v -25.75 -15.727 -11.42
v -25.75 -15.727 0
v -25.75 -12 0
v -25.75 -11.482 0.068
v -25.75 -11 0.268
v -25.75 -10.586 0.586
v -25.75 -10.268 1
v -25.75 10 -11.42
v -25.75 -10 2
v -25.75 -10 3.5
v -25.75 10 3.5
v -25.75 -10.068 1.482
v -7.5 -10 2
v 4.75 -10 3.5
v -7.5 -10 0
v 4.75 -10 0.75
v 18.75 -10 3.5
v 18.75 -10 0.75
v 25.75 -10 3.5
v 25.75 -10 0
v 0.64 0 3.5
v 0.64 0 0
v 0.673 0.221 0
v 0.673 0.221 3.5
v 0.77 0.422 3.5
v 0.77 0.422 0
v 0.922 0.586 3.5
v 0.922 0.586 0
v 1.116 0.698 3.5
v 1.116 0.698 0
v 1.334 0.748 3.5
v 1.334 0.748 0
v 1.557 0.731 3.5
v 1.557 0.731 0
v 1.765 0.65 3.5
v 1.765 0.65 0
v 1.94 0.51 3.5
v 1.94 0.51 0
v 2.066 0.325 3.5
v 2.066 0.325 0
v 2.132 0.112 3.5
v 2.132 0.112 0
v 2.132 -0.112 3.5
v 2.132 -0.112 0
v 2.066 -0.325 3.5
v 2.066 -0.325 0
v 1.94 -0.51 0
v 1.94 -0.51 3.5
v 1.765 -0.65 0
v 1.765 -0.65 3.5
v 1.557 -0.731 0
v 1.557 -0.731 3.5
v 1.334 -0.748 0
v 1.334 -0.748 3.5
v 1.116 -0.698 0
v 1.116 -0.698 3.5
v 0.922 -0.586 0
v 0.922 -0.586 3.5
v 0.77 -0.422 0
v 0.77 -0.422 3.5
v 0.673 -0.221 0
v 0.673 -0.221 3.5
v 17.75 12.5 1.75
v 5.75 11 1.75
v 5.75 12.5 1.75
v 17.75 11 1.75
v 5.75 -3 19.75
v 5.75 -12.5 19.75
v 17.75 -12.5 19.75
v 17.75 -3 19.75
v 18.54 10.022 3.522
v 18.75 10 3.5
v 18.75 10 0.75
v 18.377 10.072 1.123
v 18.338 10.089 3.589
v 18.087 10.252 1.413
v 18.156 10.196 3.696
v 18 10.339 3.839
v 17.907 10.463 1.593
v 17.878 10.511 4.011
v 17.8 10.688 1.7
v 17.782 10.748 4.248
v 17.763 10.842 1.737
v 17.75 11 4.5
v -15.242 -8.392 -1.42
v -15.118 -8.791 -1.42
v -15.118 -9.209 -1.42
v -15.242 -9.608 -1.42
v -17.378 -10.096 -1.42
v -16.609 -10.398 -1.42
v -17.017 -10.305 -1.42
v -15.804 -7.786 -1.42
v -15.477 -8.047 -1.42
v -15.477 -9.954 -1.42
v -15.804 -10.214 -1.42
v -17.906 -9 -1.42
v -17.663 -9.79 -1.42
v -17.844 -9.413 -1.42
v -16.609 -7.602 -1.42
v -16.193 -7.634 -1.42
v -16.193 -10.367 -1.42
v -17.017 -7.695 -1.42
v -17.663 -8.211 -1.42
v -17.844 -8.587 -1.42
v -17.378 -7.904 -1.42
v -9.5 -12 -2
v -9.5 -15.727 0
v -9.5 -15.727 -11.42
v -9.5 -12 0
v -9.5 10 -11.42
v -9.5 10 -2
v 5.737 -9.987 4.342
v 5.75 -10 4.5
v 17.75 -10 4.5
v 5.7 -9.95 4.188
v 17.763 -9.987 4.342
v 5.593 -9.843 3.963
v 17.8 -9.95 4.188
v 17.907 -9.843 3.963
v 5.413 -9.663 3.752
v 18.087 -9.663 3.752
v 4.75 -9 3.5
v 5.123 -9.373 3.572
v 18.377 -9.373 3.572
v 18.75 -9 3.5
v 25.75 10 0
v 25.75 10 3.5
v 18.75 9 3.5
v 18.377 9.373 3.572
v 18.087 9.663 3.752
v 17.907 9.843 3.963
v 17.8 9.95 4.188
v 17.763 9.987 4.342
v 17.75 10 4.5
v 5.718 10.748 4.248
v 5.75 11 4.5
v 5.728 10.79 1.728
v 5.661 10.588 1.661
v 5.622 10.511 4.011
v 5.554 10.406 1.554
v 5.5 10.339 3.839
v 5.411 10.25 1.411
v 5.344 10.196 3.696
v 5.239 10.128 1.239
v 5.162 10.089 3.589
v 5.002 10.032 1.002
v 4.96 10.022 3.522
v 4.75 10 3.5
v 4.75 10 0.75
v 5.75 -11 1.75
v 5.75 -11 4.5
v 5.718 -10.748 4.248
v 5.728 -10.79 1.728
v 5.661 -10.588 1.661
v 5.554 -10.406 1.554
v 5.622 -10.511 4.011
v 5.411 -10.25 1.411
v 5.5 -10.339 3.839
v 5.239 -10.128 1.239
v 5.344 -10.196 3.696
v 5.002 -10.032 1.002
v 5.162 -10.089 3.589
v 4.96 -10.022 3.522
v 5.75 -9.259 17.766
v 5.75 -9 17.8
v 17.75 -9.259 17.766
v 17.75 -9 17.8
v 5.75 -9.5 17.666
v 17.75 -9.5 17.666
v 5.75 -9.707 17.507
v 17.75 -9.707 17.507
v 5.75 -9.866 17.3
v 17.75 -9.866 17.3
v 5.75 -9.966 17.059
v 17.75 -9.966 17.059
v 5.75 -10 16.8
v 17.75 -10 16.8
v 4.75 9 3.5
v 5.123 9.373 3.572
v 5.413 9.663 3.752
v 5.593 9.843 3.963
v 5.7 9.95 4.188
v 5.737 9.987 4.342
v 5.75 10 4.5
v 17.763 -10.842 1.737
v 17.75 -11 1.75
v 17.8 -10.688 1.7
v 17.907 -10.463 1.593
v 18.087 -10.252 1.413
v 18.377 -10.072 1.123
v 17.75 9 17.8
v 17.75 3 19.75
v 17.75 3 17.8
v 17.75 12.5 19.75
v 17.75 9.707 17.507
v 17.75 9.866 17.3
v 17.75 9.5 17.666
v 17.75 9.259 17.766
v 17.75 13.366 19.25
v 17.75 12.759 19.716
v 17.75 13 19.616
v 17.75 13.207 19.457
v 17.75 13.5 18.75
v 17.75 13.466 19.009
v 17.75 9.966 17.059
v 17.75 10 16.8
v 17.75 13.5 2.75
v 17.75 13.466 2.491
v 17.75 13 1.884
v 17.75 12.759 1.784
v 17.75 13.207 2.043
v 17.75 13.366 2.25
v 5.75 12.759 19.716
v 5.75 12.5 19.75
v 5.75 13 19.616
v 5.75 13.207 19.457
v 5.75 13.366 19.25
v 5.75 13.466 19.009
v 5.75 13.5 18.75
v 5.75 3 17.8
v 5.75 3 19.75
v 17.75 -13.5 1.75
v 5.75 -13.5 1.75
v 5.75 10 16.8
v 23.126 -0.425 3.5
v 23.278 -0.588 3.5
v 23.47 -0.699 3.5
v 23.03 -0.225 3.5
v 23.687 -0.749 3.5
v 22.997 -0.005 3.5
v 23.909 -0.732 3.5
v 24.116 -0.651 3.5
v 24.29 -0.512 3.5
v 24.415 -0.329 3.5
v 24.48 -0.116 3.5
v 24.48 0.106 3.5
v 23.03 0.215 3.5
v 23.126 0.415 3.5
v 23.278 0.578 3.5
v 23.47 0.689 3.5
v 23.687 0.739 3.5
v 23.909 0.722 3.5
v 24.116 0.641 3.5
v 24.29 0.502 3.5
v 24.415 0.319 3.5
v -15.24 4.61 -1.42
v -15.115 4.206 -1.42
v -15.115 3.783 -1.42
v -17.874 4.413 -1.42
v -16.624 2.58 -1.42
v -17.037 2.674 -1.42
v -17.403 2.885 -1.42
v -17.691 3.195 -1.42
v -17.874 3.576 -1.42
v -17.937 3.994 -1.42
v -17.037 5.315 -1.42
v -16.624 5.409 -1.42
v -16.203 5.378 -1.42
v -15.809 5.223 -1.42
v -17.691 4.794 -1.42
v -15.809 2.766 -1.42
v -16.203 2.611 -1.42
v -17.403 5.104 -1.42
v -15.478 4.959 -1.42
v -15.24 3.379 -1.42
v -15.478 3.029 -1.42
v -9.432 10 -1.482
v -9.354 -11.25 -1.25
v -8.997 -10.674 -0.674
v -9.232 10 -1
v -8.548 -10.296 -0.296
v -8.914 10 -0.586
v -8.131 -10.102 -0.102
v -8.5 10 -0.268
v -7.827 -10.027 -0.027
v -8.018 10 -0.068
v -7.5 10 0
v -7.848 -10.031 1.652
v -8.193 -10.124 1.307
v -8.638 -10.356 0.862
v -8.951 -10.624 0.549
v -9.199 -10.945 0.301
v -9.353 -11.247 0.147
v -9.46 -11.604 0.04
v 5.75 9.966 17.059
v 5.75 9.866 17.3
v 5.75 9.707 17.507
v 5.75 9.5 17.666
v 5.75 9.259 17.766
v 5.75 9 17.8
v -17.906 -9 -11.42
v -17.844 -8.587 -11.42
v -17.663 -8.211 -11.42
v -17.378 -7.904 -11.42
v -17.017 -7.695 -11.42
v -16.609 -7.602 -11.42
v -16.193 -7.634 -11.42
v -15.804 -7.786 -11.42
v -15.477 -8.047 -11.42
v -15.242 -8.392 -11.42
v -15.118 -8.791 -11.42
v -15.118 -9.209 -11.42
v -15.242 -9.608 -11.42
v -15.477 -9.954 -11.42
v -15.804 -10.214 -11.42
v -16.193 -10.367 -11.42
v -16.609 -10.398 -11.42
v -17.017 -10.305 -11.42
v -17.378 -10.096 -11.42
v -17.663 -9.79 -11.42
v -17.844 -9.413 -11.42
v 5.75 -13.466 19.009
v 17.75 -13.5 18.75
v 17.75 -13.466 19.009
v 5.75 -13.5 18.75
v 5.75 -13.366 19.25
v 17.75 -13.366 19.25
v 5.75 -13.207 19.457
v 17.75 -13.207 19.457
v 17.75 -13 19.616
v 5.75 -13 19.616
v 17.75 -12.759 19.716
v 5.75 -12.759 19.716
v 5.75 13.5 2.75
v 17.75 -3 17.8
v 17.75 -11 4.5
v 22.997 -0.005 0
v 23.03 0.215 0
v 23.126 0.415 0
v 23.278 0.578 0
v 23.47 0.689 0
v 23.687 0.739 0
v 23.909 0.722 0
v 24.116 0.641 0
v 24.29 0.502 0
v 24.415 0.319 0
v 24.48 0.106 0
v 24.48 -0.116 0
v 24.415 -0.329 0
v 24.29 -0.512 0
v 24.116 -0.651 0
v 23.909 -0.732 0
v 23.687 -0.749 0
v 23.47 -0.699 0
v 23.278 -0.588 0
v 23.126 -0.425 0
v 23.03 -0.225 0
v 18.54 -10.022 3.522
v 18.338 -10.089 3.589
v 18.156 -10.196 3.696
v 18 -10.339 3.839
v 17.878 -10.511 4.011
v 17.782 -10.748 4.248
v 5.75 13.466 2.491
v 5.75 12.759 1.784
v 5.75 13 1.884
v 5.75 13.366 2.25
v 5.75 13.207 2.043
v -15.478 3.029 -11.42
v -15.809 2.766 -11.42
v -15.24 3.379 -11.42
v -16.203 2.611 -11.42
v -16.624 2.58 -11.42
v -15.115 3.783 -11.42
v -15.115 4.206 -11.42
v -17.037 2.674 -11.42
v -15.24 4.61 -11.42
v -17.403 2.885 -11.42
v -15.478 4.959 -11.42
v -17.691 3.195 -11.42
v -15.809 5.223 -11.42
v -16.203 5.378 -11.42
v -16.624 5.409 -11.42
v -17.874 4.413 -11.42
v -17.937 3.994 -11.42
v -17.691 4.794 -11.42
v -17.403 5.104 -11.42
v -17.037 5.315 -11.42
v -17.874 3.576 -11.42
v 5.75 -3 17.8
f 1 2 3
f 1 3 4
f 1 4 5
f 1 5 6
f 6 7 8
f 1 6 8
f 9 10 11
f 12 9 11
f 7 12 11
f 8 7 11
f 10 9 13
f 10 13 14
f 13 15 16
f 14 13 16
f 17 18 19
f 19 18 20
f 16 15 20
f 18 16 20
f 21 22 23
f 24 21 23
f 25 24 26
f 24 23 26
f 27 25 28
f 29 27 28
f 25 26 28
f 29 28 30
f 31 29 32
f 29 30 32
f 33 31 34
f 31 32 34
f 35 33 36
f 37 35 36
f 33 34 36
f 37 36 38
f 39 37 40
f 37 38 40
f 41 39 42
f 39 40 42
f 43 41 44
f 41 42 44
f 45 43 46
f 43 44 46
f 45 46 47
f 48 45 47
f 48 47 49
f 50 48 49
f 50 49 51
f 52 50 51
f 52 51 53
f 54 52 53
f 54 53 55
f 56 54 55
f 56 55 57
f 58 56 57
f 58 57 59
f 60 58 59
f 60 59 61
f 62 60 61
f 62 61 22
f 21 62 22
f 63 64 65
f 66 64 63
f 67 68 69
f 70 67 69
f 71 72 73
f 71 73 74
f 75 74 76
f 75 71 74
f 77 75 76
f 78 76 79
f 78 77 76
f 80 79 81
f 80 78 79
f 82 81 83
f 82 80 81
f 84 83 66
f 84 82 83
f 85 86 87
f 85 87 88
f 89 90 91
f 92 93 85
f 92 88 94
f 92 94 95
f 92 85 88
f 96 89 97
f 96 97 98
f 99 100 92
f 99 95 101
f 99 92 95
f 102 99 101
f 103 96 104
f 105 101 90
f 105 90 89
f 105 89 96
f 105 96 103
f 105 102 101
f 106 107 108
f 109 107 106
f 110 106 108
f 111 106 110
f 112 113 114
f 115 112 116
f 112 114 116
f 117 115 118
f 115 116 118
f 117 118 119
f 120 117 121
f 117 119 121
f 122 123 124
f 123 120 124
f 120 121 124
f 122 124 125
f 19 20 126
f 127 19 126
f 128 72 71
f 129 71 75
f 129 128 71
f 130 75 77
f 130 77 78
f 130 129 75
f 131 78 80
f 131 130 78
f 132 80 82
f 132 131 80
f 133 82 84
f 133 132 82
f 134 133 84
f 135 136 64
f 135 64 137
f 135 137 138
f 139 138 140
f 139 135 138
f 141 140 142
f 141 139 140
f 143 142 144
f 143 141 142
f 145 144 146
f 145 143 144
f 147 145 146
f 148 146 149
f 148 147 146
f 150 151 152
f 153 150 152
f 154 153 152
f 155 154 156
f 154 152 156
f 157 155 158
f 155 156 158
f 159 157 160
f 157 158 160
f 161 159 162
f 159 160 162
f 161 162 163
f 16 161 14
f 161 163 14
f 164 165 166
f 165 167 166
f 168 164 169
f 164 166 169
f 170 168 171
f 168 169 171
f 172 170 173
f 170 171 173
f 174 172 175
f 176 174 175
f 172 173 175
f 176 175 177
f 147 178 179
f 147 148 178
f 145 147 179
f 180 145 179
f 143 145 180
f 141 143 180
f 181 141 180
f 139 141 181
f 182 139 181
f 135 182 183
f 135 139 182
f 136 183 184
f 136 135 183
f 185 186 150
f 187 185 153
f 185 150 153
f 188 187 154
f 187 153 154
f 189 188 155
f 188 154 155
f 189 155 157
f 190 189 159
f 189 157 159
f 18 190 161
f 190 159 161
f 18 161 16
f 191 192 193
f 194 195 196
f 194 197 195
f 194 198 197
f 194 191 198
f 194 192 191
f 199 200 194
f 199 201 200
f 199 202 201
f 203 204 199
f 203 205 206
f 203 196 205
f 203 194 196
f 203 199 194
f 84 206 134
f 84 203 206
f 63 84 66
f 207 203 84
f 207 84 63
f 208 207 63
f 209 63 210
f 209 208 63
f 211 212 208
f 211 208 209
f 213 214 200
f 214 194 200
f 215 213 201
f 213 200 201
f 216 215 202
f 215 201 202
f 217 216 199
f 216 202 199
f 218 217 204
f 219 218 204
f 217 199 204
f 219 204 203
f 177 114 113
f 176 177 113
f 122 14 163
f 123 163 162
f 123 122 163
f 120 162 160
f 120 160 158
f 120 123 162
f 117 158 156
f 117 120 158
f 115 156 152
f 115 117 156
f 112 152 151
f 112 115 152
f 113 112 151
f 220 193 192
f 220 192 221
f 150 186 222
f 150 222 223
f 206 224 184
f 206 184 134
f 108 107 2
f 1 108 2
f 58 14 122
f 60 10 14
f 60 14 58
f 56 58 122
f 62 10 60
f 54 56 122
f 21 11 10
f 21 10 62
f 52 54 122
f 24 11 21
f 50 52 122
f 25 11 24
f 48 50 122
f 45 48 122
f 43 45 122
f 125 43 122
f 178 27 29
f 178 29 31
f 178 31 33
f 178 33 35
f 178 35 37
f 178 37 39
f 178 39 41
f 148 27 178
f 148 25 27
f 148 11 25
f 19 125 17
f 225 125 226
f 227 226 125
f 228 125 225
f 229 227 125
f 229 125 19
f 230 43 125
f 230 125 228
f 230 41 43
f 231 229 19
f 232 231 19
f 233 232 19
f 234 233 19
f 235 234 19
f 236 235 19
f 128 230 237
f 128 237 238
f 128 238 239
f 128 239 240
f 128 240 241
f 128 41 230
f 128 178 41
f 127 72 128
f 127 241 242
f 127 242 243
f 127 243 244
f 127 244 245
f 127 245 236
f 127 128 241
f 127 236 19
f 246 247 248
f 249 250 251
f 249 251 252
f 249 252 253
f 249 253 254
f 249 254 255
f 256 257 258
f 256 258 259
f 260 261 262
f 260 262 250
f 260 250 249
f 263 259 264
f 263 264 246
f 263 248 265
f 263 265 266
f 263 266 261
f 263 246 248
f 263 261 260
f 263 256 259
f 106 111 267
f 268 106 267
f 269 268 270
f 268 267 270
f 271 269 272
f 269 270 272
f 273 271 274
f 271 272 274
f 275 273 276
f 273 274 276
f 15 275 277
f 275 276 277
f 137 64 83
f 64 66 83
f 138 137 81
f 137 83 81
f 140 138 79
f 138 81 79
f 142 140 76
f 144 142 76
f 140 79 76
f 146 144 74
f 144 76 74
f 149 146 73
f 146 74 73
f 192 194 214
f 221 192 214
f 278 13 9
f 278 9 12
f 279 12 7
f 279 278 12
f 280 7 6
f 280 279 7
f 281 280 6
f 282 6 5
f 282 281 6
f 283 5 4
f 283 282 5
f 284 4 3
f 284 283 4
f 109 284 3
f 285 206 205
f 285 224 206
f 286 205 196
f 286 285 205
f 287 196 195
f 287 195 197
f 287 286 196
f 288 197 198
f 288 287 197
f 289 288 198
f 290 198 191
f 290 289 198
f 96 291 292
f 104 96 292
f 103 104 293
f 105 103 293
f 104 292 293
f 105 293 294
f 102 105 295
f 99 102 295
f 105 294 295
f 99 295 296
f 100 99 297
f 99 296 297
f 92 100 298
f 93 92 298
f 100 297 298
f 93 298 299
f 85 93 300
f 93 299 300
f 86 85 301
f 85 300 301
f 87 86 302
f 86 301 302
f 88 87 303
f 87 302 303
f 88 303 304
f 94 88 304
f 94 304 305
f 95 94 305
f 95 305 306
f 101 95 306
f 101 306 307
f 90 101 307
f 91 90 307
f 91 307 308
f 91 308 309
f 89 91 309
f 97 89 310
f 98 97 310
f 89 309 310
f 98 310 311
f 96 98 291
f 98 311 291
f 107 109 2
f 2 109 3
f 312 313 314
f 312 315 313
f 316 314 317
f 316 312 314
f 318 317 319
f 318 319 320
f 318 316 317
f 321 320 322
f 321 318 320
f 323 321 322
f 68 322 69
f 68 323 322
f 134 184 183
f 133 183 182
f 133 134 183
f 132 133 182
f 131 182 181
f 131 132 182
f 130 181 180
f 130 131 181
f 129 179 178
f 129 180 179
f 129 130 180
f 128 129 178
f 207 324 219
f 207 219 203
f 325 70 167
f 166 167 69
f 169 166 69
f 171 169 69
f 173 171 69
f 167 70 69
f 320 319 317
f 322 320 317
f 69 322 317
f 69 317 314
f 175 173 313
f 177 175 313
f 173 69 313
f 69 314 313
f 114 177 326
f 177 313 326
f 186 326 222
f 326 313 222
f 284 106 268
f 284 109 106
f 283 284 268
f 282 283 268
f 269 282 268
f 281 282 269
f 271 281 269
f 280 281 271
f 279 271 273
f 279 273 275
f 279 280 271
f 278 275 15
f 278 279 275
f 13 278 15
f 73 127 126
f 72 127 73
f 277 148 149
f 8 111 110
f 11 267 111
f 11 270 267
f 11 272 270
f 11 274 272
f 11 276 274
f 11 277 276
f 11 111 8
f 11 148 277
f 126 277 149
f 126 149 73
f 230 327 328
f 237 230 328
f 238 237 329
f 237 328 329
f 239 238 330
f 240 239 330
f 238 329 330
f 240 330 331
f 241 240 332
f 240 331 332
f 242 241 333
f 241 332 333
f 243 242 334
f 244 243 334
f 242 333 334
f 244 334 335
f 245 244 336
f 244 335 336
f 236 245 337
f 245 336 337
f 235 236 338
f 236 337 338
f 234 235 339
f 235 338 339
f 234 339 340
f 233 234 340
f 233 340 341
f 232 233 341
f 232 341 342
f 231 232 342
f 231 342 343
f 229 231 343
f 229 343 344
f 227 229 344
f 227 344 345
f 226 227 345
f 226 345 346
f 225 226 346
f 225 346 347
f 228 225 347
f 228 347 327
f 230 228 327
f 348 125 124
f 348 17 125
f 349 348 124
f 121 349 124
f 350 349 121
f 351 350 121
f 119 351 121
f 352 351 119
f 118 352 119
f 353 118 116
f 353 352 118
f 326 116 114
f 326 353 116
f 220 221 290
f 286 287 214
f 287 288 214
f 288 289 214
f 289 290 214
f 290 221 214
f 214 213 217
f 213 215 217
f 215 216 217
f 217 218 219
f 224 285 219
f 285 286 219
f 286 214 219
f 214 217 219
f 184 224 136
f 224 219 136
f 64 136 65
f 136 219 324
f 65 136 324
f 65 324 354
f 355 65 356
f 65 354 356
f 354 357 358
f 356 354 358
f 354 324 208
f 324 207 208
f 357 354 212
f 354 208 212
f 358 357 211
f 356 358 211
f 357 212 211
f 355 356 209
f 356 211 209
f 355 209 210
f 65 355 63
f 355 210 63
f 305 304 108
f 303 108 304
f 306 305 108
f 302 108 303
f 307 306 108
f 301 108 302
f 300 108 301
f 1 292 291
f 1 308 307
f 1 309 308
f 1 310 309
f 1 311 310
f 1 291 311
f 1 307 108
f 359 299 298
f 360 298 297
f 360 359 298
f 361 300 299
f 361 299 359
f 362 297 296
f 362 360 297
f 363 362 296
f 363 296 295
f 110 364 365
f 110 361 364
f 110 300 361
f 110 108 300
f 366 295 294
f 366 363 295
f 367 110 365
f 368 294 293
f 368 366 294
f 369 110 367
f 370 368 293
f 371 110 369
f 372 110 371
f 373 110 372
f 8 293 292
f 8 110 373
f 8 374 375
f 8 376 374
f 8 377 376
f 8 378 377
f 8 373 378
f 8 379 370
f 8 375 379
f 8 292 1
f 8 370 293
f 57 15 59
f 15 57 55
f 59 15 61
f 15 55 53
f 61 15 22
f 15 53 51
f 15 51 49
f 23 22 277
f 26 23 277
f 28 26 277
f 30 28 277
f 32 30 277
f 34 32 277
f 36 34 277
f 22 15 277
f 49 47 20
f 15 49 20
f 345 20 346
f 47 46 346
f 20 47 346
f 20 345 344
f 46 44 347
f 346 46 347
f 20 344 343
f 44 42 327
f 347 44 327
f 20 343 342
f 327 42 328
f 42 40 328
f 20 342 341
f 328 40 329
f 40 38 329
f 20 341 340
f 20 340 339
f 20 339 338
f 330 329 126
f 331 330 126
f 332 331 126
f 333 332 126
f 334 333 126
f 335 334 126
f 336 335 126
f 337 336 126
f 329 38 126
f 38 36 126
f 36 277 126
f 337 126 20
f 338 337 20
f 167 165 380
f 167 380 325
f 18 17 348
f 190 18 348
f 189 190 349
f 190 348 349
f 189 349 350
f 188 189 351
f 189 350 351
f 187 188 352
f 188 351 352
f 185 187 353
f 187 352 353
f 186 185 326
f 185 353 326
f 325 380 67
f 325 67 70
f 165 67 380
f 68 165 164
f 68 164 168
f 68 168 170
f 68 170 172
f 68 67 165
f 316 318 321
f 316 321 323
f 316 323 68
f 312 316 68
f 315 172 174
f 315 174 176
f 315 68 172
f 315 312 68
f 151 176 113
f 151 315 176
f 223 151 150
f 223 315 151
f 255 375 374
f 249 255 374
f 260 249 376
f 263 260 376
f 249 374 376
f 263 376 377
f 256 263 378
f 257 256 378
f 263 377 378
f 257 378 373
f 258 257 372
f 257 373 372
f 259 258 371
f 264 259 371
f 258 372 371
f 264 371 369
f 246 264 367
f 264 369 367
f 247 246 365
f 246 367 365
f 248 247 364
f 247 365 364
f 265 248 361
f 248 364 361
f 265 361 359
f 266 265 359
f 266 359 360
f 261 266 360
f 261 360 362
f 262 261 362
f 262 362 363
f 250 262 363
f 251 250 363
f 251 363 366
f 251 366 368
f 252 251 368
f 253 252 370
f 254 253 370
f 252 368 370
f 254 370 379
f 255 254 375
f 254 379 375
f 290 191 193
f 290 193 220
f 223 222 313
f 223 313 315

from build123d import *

# Parameters (mm, degrees)
SKETCH1_W           = 51.5
SKETCH1_H           = 20
BOSS_EXTRUDE1_DEPTH = 3.5
SKETCH2_W           = 12
SKETCH2_H           = 18
BOSS_EXTRUDE2_DEPTH = 3.5
FILLET1_R           = 1
FILLET2_R           = 1
SKETCH3_W           = 12
SKETCH3_H           = 18
BOSS_EXTRUDE3_DEPTH = 3.5
FILLET3_R           = 1
FILLET4_R           = 1
FILLET5_R           = 1
FILLET6_R           = 1
FILLET7_R           = 1
FILLET8_R           = 1
FILLET9_R           = 1
FILLET10_R          = 1
FILLET11_R          = 1
FILLET12_R          = 1
SKETCH4_W           = 12
SKETCH4_H           = 1.95
BOSS_EXTRUDE4_DEPTH = 7
SKETCH5_W           = 12
SKETCH5_H           = 1.95
BOSS_EXTRUDE5_DEPTH = 7
FILLET13_R          = 1
FILLET14_R          = 1
FILLET15_R          = 1
FILLET16_R          = 1
FILLET17_R          = 1
SKETCH8_W           = 16.25
SKETCH8_H           = 25.726511914
BOSS_EXTRUDE6_DEPTH = 11.42
FILLET21_R          = 2
FILLET22_R          = 2
FILLET23_R          = 2
SKETCH9_R           = 0.745983734
CUT_EXTRUDE1_DEPTH  = 10
SKETCH10_R          = 0.75
CUT_EXTRUDE2_DEPTH  = 10
SKETCH11_R          = 1.41875541
CUT_EXTRUDE3_DEPTH  = 10
SKETCH12_R          = 1.401780947
CUT_EXTRUDE4_DEPTH  = 10


with BuildPart() as part:
    # Sketch1 → Boss-Extrude1 (new body)
    with BuildSketch(Plane.XY):
        Rectangle(SKETCH1_W, SKETCH1_H)
    extrude(amount=BOSS_EXTRUDE1_DEPTH)

    # Sketch2 → Boss-Extrude2 (add)
    with BuildSketch(Plane(origin=(0, 10, 0), x_dir=(1, 0, 0), z_dir=(0, 1, 0))):
        with Locations((11.75, -10.75)):
            Rectangle(SKETCH2_W, SKETCH2_H)
    extrude(amount=BOSS_EXTRUDE2_DEPTH)

    # Fillet1
    fillet1_edges = [part.edges().sort_by_distance(p)[0] for p in [
        (11.75, 10, 1.75),
    ]]
    fillet(fillet1_edges, radius=FILLET1_R)

    # Fillet2
    fillet2_edges = [part.edges().sort_by_distance(p)[0] for p in [
        (11.75, 10, 3.5),
    ]]
    fillet(fillet2_edges, radius=FILLET2_R)

    # Sketch3 → Boss-Extrude3 (add)
    with BuildSketch(Plane(origin=(0, -10, 0), x_dir=(-1, 0, 0), z_dir=(0, -1, 0))):
        with Locations((-11.75, -10.75)):
            Rectangle(SKETCH3_W, SKETCH3_H)
    extrude(amount=BOSS_EXTRUDE3_DEPTH)

    # Fillet3
    fillet3_edges = [part.edges().sort_by_distance(p)[0] for p in [
        (11.75, -10, 1.75),
    ]]
    fillet(fillet3_edges, radius=FILLET3_R)

    # Fillet4
    fillet4_edges = [part.edges().sort_by_distance(p)[0] for p in [
        (11.75, -10, 3.5),
    ]]
    fillet(fillet4_edges, radius=FILLET4_R)

    # Fillet5
    fillet5_edges = [part.edges().sort_by_distance(p)[0] for p in [
        (17.75, 10, 2.125),
    ]]
    fillet(fillet5_edges, radius=FILLET5_R)

    # Fillet6
    fillet6_edges = [part.edges().sort_by_distance(p)[0] for p in [
        (5.75, 10, 2.125),
    ]]
    fillet(fillet6_edges, radius=FILLET6_R)

    # Fillet7
    fillet7_edges = [part.edges().sort_by_distance(p)[0] for p in [
        (17.75, 10, 3.5),
    ]]
    fillet(fillet7_edges, radius=FILLET7_R)

    # Fillet8
    fillet8_edges = [part.edges().sort_by_distance(p)[0] for p in [
        (5.75, 10, 3.5),
    ]]
    fillet(fillet8_edges, radius=FILLET8_R)

    # Fillet9
    fillet9_edges = [part.edges().sort_by_distance(p)[0] for p in [
        (5.75, -10, 2.125),
    ]]
    fillet(fillet9_edges, radius=FILLET9_R)

    # Fillet10
    fillet10_edges = [part.edges().sort_by_distance(p)[0] for p in [
        (5.75, -10, 3.5),
    ]]
    fillet(fillet10_edges, radius=FILLET10_R)

    # Fillet11
    fillet11_edges = [part.edges().sort_by_distance(p)[0] for p in [
        (17.75, -10, 2.125),
    ]]
    fillet(fillet11_edges, radius=FILLET11_R)

    # Fillet12
    fillet12_edges = [part.edges().sort_by_distance(p)[0] for p in [
        (17.75, -10, 3.5),
    ]]
    fillet(fillet12_edges, radius=FILLET12_R)

    # Sketch4 → Boss-Extrude4 (add)
    with BuildSketch(Plane(origin=(0, -10, 0), x_dir=(1, 0, 0), z_dir=(0, 1, 0))):
        with Locations((11.75, -18.775)):
            Rectangle(SKETCH4_W, SKETCH4_H)
    extrude(amount=BOSS_EXTRUDE4_DEPTH)

    # Sketch5 → Boss-Extrude5 (add)
    with BuildSketch(Plane(origin=(0, 10, 0), x_dir=(-1, 0, 0), z_dir=(0, -1, 0))):
        with Locations((-11.75, -18.775)):
            Rectangle(SKETCH5_W, SKETCH5_H)
    extrude(amount=BOSS_EXTRUDE5_DEPTH)

    # Fillet13
    fillet13_edges = [part.edges().sort_by_distance(p)[0] for p in [
        (11.75, 10, 17.8),
    ]]
    fillet(fillet13_edges, radius=FILLET13_R)

    # Fillet14
    fillet14_edges = [part.edges().sort_by_distance(p)[0] for p in [
        (11.75, 13.5, 19.75),
    ]]
    fillet(fillet14_edges, radius=FILLET14_R)

    # Fillet15
    fillet15_edges = [part.edges().sort_by_distance(p)[0] for p in [
        (11.75, 13.5, 1.75),
    ]]
    fillet(fillet15_edges, radius=FILLET15_R)

    # Fillet16
    fillet16_edges = [part.edges().sort_by_distance(p)[0] for p in [
        (11.75, -13.5, 19.75),
    ]]
    fillet(fillet16_edges, radius=FILLET16_R)

    # Fillet17
    fillet17_edges = [part.edges().sort_by_distance(p)[0] for p in [
        (11.75, -10, 17.8),
    ]]
    fillet(fillet17_edges, radius=FILLET17_R)

    # Sketch8 → Boss-Extrude6 (add)
    with BuildSketch(Plane(origin=(0, 0, 0), x_dir=(-1, 0, 0), z_dir=(0, 0, -1))):
        with Locations((17.625, -2.863255957)):
            Rectangle(SKETCH8_W, SKETCH8_H)
    extrude(amount=BOSS_EXTRUDE6_DEPTH)

    # Fillet21
    fillet21_edges = [part.edges().sort_by_distance(p)[0] for p in [
        (-9.5, 0, 0),
    ]]
    fillet(fillet21_edges, radius=FILLET21_R)

    # Fillet22
    fillet22_edges = [part.edges().sort_by_distance(p)[0] for p in [
        (-17.625, -10, 0),
    ]]
    fillet(fillet22_edges, radius=FILLET22_R)

    # Fillet23
    fillet23_edges = [part.edges().sort_by_distance(p)[0] for p in [
        (-9.5, -10, 0),
    ]]
    fillet(fillet23_edges, radius=FILLET23_R - 0.0001)  # a hair under: the kernel refuses the full size

    # Sketch9 → Cut-Extrude1 (cut)
    with BuildSketch(Plane(origin=(0, 0, 0), x_dir=(-1, 0, 0), z_dir=(0, 0, -1))):
        with Locations((-23.742674676, -0.005014859)):
            Circle(SKETCH9_R)
    extrude(amount=-CUT_EXTRUDE1_DEPTH, mode=Mode.SUBTRACT)

    # Sketch10 → Cut-Extrude2 (cut)
    with BuildSketch(Plane(origin=(0, 0, 0), x_dir=(-1, 0, 0), z_dir=(0, 0, -1))):
        with Locations((-1.39, 0)):
            Circle(SKETCH10_R)
    extrude(amount=-CUT_EXTRUDE2_DEPTH, mode=Mode.SUBTRACT)

    # Sketch11 → Cut-Extrude3 (cut)
    with BuildSketch(Plane(origin=(0, 0, -11.42), x_dir=(-1, 0, 0), z_dir=(0, 0, -1))):
        with Locations((16.518366767, 3.994492079)):
            Circle(SKETCH11_R)
    extrude(amount=-CUT_EXTRUDE3_DEPTH, mode=Mode.SUBTRACT)

    # Sketch12 → Cut-Extrude4 (cut)
    with BuildSketch(Plane(origin=(0, 0, -11.42), x_dir=(-1, 0, 0), z_dir=(0, 0, -1))):
        with Locations((16.50448956, -9.000225668)):
            Circle(SKETCH12_R)
    extrude(amount=-CUT_EXTRUDE4_DEPTH, mode=Mode.SUBTRACT)


solid = part.part
